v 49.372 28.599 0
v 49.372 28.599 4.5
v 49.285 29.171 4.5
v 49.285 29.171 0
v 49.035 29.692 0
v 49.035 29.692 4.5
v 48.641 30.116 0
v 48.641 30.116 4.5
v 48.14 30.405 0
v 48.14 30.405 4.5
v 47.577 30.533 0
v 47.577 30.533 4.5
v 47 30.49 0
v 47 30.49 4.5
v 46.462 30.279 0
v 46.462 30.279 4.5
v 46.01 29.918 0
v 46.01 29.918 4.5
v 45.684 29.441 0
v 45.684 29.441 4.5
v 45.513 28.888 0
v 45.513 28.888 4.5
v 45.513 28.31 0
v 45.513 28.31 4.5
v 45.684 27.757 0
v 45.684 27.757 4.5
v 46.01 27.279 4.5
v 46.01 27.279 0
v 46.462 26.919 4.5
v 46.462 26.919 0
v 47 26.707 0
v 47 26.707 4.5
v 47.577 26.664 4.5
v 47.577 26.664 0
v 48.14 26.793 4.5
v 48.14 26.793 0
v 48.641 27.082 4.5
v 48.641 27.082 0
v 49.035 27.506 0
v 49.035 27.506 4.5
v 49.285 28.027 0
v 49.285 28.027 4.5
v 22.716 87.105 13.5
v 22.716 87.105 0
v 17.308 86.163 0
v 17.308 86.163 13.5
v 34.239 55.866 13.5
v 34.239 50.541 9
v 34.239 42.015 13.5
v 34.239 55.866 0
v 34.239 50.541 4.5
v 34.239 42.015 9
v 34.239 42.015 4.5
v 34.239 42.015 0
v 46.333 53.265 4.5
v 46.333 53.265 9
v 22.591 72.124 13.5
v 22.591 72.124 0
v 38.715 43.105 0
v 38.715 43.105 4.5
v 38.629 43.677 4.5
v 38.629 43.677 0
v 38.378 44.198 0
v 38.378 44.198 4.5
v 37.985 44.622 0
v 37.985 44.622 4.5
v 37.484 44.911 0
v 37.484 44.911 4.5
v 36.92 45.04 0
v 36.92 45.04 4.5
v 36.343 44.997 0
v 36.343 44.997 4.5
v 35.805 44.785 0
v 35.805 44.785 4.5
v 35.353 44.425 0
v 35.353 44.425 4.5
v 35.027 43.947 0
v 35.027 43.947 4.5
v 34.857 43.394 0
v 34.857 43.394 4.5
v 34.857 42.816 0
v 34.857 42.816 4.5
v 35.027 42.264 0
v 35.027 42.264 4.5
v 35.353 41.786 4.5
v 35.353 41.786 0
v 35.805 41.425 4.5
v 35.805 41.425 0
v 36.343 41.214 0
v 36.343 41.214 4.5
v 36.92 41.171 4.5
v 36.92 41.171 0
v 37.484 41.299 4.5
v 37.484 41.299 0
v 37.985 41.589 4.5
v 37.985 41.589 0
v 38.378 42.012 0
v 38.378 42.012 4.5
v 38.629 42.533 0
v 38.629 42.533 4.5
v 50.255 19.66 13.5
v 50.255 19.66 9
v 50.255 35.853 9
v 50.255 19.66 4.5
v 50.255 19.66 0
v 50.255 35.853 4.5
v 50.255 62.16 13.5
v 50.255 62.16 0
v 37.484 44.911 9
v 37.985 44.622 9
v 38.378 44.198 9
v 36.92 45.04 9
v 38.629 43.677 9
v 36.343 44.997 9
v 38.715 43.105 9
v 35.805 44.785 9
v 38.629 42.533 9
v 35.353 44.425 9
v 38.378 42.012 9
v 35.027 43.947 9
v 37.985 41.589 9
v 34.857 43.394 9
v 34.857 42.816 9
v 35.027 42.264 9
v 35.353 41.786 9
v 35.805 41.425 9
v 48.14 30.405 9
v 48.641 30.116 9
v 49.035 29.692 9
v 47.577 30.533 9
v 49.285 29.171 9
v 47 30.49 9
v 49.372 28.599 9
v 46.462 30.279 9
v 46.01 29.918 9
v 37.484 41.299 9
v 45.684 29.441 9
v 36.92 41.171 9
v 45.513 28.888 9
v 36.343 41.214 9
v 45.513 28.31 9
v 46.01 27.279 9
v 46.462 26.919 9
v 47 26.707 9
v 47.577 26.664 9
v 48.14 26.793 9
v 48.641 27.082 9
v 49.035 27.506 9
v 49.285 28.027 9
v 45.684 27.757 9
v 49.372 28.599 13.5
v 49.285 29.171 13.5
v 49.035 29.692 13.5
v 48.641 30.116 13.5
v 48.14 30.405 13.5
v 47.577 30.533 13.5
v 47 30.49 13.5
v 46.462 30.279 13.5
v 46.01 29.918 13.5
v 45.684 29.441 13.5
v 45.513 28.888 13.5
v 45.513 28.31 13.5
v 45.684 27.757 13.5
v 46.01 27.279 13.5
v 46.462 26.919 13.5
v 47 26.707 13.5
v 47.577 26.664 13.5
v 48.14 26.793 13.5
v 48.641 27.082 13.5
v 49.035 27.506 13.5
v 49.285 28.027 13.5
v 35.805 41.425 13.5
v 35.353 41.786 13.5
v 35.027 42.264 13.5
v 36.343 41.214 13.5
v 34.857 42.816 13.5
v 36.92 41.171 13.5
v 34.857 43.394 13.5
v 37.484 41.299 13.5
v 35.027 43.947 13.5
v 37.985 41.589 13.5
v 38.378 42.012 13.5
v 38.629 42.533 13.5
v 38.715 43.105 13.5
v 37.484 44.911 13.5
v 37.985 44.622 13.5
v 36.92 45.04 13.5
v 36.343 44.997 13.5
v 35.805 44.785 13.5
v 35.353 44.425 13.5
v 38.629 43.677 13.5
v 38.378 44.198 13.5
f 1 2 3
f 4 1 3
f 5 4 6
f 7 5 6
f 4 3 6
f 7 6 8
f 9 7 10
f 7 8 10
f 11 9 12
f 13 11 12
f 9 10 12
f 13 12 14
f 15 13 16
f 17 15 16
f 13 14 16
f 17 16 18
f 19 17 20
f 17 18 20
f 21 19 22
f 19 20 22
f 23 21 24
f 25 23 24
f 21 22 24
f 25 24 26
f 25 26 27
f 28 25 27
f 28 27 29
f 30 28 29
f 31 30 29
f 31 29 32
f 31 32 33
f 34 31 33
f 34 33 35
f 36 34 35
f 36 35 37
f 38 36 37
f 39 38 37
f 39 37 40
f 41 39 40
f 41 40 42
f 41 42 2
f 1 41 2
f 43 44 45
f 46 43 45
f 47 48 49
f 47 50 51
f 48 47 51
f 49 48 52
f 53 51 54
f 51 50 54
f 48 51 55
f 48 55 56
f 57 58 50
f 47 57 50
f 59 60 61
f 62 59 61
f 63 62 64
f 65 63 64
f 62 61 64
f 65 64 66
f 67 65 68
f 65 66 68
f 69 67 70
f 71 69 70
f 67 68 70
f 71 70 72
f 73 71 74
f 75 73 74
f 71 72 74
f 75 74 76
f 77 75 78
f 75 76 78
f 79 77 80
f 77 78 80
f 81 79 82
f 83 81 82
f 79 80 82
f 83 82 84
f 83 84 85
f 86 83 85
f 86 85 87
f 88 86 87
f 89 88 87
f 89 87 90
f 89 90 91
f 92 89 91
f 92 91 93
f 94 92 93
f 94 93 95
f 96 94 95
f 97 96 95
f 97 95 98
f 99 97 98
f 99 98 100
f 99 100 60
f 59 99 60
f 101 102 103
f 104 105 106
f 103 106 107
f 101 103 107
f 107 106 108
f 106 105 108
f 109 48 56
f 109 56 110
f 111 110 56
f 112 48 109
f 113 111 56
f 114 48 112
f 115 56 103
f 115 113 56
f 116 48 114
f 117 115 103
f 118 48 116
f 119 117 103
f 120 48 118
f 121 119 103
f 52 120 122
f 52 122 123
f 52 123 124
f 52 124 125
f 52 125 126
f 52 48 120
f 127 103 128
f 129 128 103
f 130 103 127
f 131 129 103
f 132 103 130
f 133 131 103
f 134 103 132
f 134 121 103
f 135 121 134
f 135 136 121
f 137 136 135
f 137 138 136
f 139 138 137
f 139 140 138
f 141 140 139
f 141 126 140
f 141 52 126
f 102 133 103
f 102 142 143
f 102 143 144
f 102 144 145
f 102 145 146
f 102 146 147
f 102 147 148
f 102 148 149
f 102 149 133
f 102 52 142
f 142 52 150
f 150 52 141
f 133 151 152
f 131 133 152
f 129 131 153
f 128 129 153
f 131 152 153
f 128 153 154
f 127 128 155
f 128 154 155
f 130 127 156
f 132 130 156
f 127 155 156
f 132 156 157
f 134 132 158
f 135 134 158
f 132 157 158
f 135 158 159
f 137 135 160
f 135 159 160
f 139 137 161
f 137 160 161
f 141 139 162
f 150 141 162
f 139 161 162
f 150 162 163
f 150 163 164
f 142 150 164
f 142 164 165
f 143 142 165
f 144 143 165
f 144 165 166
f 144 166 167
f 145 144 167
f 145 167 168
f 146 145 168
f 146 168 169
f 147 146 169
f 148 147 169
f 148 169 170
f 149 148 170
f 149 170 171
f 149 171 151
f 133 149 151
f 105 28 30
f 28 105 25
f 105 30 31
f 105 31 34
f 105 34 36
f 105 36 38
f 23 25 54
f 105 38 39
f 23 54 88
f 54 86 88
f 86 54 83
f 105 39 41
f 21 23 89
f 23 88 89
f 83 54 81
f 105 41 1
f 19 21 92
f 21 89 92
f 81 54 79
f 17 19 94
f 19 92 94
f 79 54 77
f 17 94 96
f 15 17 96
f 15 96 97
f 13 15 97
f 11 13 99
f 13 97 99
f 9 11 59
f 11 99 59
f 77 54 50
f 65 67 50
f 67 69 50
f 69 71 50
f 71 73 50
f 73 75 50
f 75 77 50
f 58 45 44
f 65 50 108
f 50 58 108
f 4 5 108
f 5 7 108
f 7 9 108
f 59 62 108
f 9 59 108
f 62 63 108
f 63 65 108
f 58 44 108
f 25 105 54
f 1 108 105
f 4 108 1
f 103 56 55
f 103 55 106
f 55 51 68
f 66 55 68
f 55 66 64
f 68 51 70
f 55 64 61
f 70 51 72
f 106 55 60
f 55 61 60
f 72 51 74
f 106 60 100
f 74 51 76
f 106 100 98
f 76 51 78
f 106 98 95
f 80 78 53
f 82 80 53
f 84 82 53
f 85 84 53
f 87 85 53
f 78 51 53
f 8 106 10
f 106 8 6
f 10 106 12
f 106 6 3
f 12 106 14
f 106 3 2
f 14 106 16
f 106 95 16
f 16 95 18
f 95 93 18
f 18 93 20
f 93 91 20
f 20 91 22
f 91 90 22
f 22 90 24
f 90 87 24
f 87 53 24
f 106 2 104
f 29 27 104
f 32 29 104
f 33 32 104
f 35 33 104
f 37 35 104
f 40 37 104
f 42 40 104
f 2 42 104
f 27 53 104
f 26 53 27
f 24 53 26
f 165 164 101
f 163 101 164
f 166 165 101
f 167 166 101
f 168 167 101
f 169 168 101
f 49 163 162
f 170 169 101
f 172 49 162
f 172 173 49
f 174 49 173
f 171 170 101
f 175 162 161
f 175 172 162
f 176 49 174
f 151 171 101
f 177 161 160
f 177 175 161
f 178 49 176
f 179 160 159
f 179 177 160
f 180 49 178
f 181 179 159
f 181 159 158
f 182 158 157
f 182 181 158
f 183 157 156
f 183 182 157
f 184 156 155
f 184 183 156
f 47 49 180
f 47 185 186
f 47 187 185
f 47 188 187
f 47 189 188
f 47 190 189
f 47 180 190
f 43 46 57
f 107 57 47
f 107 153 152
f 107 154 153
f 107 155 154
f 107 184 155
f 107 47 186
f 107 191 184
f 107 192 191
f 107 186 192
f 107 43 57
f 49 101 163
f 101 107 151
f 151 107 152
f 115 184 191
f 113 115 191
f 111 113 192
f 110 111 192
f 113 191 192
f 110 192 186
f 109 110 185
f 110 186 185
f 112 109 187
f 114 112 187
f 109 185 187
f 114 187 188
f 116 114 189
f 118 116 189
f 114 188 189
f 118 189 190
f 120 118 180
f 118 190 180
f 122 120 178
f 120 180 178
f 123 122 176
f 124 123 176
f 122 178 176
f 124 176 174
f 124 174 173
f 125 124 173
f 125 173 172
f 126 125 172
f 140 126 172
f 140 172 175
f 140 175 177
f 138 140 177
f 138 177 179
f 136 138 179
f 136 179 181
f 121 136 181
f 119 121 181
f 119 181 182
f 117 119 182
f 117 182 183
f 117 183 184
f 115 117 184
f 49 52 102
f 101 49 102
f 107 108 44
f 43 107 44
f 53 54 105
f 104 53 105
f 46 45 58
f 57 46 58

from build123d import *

# Parameters (mm, degrees)
SKETCH001_AS_DRAWN_W                      = 35
SKETCH001_AS_DRAWN_H                      = 4.5
EXTRUDE001_DEPTH                          = 15
EXTRUDE001_ONTO_SKETCH001_ROLL_ANGLE      = 90
EXTRUDE001_ONTO_SKETCH001_PLACEMENT_ANGLE = -92.306069
EXTRUDE001_PLACEMENT_ANGLE                = 15
SKETCH002_R                               = 1.94
EXTRUDE002_DEPTH                          = 15
EXTRUDE_DEPTH                             = 13.5


with BuildPart() as extrude001:
    # Sketch001 as drawn → Extrude001 (new)
    with BuildSketch(Plane.XY):
        with Locations((-28.593868, 6.75)):
            Rectangle(SKETCH001_AS_DRAWN_W, SKETCH001_AS_DRAWN_H)
    extrude(amount=-EXTRUDE001_DEPTH)


with BuildPart() as extrude001_1:
    # Extrude001 onto Sketch001 roll: moved
    add(extrude001.part.rotate(Axis((0, 0, 0), (1, 0, 0)), EXTRUDE001_ONTO_SKETCH001_ROLL_ANGLE))


with BuildPart() as extrude001_2:
    # Extrude001 onto Sketch001 placement: moved
    add(extrude001_1.part.moved(Location((24.697887, -0.99459, 0))).rotate(Axis((24.697887, -0.99459, 0), (0, 0, 1)), EXTRUDE001_ONTO_SKETCH001_PLACEMENT_ANGLE))


with BuildPart() as extrude001_3:
    # Extrude001 placement: moved
    add(extrude001_2.part.moved(Location((17.714834, -0.429705, 0))).rotate(Axis((17.714834, -0.429705, 0), (0, 0, 1)), EXTRUDE001_PLACEMENT_ANGLE))


with BuildPart() as extrude002:
    # Sketch002 → Extrude002 (new body)
    with BuildSketch(Plane.XY.offset(13.5)):
        with Locations((36.775076, 43.105323)):
            Circle(SKETCH002_R)
        with Locations((47.431625, 28.598843)):
            Circle(SKETCH002_R)
    extrude(amount=-EXTRUDE002_DEPTH)


with BuildPart() as cut001:
    # Sketch → Extrude (new body)
    with BuildSketch(Plane.XY):
        Polygon((34.239132, 42.01487), (50.255318, 19.660189), (50.255318, 62.160189), (22.716467, 87.104851), (17.308471, 86.162684), (22.590996, 72.123634), (34.239132, 55.865684), align=None)
    extrude(amount=EXTRUDE_DEPTH)

    # Cut: cut Extrude002
    add(extrude002.part, mode=Mode.SUBTRACT)

    # Cut001: cut Extrude001
    add(extrude001_3.part, mode=Mode.SUBTRACT)


solid = cut001.part
